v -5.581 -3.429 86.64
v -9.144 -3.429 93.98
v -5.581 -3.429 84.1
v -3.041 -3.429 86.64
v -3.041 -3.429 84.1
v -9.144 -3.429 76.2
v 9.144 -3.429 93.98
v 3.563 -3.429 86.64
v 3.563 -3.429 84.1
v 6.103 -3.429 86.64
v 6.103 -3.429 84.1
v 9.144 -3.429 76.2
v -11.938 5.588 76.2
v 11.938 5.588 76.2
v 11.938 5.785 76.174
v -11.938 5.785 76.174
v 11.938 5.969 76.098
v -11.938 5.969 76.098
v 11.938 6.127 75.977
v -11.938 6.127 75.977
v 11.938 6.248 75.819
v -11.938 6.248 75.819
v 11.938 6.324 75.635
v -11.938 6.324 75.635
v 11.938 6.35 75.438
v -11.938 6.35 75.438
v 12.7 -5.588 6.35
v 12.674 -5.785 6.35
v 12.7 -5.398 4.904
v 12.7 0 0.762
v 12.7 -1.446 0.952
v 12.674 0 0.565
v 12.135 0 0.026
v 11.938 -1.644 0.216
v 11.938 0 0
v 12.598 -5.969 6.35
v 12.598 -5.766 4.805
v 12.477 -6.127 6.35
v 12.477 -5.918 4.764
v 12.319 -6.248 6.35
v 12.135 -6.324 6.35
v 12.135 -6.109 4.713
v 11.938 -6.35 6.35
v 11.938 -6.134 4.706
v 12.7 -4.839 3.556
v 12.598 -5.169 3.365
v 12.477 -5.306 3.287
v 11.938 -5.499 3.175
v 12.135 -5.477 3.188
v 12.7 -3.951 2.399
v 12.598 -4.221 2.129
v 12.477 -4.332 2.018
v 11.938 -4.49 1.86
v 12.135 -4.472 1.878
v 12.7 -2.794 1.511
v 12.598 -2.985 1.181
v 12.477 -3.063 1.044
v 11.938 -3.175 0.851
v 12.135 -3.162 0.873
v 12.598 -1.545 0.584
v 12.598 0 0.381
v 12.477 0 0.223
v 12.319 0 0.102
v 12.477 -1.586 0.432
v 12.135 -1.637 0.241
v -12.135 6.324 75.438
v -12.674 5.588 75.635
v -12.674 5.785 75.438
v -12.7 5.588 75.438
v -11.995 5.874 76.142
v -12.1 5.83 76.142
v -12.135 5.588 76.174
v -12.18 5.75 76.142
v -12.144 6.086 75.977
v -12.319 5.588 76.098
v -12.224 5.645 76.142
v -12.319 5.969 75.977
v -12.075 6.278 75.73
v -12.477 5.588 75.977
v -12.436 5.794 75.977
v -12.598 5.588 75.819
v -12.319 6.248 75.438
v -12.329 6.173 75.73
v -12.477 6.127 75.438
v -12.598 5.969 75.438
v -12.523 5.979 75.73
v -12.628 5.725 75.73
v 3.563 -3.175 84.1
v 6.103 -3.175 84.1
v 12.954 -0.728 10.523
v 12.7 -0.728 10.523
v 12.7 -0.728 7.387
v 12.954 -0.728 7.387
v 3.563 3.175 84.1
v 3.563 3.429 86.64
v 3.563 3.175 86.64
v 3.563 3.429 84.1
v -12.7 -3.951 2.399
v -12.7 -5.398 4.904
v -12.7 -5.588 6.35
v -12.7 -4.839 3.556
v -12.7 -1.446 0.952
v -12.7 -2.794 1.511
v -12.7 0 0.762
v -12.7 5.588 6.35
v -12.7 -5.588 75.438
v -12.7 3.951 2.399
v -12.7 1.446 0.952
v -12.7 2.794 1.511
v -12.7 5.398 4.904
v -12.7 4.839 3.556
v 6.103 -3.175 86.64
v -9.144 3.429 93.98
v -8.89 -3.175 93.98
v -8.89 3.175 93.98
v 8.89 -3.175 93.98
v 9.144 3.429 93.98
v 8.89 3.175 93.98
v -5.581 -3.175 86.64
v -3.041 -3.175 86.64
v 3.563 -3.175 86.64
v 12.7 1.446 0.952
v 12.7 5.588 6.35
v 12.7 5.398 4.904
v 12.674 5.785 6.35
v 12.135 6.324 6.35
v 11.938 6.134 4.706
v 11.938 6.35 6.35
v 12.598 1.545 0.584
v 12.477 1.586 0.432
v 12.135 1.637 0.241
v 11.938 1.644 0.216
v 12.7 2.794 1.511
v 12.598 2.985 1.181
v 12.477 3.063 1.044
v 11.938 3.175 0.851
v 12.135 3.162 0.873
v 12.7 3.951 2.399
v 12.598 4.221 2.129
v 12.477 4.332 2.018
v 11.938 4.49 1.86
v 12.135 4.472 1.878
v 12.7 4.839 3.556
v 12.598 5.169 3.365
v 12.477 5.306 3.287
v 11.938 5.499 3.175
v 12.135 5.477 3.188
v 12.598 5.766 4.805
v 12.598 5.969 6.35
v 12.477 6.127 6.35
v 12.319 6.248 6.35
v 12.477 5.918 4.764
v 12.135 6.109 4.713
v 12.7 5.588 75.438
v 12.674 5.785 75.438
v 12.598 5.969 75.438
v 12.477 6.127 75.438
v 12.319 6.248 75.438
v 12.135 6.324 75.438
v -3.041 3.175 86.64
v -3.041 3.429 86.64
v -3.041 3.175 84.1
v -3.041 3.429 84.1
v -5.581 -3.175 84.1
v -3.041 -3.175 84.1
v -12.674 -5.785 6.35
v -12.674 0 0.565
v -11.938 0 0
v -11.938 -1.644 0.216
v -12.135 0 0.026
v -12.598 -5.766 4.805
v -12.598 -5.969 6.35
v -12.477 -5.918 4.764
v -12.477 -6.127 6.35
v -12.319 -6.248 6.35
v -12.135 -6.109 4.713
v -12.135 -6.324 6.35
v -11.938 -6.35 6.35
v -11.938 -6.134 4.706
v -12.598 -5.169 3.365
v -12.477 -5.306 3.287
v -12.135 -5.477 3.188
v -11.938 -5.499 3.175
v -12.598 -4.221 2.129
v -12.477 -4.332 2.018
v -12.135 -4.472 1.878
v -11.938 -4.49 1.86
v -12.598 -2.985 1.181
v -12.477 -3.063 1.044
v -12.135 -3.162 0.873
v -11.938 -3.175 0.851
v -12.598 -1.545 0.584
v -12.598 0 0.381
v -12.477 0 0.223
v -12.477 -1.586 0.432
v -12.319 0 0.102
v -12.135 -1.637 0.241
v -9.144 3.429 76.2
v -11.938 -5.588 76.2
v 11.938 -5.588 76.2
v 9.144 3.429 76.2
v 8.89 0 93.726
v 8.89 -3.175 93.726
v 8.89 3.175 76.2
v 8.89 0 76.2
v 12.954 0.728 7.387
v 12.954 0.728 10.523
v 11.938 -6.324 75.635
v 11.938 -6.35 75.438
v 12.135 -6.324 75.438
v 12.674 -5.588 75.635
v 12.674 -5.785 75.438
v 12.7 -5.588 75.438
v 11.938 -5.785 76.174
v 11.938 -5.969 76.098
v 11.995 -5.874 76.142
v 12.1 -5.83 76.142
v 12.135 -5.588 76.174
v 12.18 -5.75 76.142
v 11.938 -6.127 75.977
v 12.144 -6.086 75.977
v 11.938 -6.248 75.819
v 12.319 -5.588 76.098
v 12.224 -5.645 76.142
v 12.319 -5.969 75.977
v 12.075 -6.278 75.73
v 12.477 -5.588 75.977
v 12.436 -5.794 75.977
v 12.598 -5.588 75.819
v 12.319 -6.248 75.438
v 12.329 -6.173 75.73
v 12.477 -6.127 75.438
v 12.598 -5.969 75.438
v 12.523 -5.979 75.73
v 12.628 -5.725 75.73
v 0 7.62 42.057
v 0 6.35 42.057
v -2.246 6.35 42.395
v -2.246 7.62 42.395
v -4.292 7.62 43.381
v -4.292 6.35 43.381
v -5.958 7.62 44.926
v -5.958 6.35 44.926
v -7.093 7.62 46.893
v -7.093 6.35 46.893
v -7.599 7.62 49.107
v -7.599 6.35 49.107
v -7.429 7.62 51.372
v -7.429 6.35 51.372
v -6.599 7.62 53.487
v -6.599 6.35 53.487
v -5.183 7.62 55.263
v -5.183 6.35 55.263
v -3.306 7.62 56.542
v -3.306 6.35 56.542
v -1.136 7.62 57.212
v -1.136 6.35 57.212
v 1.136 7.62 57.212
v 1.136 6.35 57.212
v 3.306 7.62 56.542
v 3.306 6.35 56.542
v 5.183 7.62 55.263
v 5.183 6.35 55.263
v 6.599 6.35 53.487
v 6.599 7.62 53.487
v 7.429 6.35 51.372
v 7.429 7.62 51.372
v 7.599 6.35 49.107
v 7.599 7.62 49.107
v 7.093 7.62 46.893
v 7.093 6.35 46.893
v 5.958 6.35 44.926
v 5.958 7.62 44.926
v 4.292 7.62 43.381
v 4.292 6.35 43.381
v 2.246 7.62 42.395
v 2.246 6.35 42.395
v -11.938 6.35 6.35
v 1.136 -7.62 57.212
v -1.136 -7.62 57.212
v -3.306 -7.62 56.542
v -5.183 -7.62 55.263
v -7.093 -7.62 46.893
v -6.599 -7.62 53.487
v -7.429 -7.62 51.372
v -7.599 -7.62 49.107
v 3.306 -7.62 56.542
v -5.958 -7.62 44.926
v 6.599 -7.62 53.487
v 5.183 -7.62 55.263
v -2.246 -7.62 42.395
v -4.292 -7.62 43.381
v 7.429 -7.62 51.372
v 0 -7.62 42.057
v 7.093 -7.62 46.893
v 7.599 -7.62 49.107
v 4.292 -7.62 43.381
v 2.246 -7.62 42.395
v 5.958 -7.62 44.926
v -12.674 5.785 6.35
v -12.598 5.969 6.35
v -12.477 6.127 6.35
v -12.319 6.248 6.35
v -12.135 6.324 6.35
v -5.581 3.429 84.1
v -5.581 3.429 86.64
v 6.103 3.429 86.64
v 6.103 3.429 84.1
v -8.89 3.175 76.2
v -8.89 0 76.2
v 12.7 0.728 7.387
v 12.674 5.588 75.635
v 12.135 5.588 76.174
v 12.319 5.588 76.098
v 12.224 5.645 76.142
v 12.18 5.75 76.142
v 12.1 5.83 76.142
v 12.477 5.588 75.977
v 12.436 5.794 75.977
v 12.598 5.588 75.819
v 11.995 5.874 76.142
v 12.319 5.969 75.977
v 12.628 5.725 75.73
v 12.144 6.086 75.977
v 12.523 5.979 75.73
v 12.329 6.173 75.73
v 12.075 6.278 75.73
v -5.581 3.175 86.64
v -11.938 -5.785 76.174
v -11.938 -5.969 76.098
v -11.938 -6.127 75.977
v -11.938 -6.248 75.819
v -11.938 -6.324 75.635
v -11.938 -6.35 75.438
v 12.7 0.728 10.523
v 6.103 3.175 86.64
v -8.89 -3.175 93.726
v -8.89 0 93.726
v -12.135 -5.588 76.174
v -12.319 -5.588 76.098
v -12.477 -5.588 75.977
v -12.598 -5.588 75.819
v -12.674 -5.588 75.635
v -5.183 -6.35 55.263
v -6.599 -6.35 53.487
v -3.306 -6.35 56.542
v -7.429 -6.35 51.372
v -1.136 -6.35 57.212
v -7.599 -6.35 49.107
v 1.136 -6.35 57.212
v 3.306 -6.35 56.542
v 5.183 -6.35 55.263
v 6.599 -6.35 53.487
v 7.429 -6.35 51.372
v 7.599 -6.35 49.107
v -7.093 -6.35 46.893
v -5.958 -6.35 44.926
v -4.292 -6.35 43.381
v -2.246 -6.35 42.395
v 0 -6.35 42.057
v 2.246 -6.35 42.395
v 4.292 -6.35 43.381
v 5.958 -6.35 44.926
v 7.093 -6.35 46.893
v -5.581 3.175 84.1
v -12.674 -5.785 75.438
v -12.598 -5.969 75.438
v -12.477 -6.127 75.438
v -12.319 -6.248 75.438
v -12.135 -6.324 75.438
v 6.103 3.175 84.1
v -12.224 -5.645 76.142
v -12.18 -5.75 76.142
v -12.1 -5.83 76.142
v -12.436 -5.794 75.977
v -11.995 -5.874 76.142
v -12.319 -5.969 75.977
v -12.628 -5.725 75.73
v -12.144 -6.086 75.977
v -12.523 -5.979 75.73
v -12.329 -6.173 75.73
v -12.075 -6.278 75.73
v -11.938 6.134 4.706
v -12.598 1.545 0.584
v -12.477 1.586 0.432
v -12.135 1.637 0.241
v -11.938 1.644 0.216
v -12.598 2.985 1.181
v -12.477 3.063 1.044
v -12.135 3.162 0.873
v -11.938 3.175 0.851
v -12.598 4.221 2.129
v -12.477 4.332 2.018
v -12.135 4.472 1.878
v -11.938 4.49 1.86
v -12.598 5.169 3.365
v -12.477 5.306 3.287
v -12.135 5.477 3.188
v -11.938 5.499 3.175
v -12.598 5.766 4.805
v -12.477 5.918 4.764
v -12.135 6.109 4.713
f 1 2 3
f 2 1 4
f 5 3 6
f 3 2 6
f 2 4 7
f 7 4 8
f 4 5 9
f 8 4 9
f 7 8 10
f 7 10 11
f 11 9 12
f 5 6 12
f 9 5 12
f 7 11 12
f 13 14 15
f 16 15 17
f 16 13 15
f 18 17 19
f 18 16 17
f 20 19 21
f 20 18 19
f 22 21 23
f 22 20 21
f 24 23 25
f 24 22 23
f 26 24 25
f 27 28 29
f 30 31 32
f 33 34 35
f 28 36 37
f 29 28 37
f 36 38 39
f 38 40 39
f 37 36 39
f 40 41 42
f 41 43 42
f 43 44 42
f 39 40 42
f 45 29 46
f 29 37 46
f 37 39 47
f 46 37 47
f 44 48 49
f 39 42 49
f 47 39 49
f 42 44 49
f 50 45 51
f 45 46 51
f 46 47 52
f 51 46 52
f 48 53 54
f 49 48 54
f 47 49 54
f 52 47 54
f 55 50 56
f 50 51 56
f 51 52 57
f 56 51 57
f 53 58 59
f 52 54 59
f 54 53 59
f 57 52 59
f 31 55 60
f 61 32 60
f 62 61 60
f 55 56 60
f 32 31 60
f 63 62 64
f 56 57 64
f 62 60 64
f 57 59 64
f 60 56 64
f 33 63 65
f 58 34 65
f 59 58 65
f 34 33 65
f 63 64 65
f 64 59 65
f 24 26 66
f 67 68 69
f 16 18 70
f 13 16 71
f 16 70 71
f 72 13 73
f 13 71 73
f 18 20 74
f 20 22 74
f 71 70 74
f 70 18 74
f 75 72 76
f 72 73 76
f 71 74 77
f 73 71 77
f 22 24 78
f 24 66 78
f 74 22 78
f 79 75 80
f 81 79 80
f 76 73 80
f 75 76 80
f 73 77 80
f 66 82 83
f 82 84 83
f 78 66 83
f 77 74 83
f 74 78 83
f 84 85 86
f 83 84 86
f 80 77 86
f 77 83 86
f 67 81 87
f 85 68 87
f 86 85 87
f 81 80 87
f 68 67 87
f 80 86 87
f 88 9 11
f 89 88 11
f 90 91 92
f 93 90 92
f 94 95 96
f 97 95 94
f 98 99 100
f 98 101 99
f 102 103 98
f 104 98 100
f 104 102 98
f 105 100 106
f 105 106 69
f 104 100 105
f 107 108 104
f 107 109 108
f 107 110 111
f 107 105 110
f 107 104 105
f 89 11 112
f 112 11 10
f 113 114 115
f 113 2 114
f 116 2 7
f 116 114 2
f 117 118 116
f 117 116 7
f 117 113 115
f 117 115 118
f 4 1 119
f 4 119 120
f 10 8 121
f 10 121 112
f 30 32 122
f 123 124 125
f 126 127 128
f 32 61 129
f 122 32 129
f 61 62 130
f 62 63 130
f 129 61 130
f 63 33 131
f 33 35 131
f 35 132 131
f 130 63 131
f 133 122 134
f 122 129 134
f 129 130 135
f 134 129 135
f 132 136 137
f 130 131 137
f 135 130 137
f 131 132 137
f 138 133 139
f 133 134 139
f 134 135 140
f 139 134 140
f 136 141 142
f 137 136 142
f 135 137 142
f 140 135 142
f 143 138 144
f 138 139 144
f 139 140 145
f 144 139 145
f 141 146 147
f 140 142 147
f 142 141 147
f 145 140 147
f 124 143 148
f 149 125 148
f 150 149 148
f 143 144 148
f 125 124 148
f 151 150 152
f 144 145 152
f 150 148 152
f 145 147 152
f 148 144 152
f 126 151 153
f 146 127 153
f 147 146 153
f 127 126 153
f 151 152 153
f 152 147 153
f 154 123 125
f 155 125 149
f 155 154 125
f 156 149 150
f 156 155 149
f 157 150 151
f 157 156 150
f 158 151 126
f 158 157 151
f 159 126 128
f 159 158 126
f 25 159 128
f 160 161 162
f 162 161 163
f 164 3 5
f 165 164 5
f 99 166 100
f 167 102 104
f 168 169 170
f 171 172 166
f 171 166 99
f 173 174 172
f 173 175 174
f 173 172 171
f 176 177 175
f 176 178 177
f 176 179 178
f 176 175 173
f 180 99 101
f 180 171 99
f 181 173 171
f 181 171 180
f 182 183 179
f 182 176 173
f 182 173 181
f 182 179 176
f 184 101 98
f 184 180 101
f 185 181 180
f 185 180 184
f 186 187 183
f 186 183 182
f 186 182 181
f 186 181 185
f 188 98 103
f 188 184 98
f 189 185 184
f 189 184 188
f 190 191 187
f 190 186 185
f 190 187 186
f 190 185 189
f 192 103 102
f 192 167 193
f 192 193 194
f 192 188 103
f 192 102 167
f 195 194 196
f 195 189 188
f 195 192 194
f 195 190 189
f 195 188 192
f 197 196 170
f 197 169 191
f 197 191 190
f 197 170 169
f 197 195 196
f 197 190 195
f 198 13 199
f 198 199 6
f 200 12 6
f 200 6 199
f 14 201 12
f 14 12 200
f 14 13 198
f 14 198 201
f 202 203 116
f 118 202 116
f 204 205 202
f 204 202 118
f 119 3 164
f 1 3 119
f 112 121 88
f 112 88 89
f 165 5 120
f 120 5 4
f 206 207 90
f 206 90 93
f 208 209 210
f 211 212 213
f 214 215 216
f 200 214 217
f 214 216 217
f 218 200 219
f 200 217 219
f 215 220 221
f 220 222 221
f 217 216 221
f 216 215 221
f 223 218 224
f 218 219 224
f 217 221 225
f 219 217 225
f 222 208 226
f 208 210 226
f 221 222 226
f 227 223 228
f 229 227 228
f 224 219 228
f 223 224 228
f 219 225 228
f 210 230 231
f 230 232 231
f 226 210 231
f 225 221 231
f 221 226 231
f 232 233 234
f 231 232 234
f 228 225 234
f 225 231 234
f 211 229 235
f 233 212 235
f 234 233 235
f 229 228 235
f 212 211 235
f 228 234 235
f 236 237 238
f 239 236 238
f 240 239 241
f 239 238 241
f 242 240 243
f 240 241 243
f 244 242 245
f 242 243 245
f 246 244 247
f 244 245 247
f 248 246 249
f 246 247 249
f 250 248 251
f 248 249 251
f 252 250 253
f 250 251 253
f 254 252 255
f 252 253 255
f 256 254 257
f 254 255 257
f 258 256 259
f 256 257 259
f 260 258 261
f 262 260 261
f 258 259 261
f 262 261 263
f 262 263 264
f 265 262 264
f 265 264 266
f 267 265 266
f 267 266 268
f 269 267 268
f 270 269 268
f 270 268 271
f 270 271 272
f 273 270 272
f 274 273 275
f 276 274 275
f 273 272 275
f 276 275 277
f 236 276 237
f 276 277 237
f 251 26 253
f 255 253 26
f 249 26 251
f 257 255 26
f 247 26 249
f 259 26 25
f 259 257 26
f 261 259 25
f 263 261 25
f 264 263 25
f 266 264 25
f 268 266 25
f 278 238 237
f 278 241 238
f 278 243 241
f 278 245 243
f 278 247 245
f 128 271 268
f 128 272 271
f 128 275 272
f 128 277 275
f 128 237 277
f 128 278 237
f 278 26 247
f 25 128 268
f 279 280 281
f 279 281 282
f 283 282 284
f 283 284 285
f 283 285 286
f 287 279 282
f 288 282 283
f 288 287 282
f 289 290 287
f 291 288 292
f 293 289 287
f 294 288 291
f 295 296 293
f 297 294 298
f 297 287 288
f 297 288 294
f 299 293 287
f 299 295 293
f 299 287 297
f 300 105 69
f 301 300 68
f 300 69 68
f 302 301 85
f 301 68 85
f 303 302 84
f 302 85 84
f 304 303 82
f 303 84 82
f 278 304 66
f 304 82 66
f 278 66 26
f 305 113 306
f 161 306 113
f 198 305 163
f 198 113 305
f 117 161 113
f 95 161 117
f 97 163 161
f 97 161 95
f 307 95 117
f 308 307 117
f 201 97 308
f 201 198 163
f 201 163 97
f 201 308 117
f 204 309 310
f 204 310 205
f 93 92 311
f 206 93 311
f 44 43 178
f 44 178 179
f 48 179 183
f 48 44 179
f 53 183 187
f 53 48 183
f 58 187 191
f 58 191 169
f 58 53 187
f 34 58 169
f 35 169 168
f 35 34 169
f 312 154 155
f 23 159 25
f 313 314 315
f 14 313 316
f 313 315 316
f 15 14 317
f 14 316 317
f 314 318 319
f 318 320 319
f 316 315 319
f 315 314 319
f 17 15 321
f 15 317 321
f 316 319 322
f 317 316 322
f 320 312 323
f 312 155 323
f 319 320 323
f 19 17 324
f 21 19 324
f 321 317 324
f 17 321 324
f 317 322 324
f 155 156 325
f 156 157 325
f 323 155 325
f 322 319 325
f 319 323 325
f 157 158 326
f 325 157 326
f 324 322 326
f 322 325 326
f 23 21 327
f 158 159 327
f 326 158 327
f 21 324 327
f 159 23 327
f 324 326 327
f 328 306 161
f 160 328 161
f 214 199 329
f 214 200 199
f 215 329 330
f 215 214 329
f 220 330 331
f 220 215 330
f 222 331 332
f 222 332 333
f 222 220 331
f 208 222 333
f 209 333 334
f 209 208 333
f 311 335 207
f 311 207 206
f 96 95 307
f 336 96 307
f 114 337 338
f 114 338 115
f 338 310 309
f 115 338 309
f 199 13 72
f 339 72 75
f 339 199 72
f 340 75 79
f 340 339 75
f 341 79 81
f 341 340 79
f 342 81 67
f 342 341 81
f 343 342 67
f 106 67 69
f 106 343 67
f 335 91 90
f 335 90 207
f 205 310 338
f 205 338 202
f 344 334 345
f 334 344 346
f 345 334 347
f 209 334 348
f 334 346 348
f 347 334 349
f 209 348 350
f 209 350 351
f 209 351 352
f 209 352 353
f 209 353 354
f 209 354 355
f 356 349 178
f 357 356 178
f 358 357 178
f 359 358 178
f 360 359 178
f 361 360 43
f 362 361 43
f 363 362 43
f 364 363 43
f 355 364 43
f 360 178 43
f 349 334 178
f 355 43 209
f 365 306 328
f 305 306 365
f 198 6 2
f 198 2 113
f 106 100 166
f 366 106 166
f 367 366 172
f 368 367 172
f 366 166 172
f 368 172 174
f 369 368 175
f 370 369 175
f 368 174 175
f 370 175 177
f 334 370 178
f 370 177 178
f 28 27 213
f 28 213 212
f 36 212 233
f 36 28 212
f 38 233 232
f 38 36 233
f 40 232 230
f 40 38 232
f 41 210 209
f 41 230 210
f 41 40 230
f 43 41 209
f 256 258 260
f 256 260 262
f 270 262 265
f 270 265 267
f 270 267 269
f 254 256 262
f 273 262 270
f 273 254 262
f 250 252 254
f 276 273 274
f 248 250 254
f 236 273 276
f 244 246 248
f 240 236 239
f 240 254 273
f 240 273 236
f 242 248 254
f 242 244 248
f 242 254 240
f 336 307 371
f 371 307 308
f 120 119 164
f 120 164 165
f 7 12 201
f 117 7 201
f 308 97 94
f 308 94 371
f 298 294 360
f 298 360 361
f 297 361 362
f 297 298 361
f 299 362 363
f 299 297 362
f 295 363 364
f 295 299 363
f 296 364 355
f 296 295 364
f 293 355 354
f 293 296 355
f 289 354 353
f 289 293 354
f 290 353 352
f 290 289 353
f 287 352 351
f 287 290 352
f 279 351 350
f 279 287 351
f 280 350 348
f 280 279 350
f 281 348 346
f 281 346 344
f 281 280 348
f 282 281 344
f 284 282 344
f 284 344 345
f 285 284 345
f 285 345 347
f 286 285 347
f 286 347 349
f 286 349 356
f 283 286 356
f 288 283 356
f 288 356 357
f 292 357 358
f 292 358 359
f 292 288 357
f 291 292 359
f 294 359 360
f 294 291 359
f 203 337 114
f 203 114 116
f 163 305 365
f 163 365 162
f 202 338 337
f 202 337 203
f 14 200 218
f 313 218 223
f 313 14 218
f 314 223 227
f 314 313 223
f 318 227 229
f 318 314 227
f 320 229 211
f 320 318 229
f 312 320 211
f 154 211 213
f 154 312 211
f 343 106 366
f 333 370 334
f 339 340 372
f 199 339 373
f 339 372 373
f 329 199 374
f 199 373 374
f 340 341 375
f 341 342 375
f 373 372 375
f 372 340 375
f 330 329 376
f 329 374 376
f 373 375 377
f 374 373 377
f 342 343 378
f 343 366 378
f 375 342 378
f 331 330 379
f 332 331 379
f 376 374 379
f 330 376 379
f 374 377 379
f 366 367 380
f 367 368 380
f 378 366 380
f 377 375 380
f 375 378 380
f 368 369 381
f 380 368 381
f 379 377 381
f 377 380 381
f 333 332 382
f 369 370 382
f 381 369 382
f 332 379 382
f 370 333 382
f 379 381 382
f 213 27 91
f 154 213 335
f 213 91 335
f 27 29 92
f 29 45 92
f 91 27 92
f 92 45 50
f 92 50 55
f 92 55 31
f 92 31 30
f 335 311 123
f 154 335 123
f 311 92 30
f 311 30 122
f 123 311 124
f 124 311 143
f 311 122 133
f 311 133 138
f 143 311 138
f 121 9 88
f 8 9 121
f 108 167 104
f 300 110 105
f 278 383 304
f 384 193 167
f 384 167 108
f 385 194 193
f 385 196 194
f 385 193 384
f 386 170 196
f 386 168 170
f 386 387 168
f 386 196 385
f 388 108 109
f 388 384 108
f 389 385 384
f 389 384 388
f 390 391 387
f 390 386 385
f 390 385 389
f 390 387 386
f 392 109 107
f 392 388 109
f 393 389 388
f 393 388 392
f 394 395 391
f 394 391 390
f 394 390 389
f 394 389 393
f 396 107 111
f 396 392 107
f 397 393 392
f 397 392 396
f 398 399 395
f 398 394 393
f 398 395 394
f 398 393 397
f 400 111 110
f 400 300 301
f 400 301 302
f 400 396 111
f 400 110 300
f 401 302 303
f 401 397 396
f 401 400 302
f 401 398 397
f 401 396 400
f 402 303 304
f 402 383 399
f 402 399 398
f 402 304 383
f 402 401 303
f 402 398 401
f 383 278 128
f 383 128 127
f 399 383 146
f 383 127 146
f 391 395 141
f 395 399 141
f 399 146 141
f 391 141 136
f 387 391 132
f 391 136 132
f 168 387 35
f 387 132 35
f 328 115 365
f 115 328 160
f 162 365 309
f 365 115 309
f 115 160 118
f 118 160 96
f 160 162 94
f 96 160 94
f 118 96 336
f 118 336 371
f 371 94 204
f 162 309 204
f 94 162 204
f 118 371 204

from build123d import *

# Parameters (mm, degrees)
SKETCH1_W           = 25.4
SKETCH1_H           = 12.7
BOSS_EXTRUDE1_DEPTH = 76.2
FILLET1_R           = 6.35
SKETCH3_W           = 18.288
SKETCH3_H           = 6.858
SKETCH3_W_2         = 17.78
SKETCH3_H_2         = 6.35
BOSS_EXTRUDE2_DEPTH = 17.78
SKETCH4_W           = 17.78
SKETCH4_H           = 3.175
BOSS_EXTRUDE3_DEPTH = 17.526
SKETCH5_W           = 2.54
SKETCH5_H           = 2.54
CUT_EXTRUDE1_DEPTH  = 0.254
SKETCH7_W           = 2.54
SKETCH7_H           = 2.54
CUT_EXTRUDE6_DEPTH  = 0.254
FILLET2_R           = 0.762
FILLET3_R           = 0.762
SKETCH20_R          = 7.62
BOSS_EXTRUDE4_DEPTH = 1.27
BOSS_EXTRUDE5_START = 1.27
SKETCH21_R          = 7.62
BOSS_EXTRUDE5_DEPTH = 1.27
SKETCH23_W          = 3.136693438
SKETCH23_H          = 1.456321954
BOSS_EXTRUDE6_DEPTH = 0.254


with BuildPart() as part:
    # Sketch1 → Boss-Extrude1 (new body)
    with BuildSketch(Plane.XY):
        Rectangle(SKETCH1_W, SKETCH1_H)
    extrude(amount=BOSS_EXTRUDE1_DEPTH)

    # Fillet1
    fillet1_edges = [part.edges().sort_by_distance(p)[0] for p in [
        (0, 6.35, 0),
        (0, -6.35, 0),
    ]]
    fillet(fillet1_edges, radius=FILLET1_R - 0.0001)  # a hair under: the kernel refuses the full size

    # Sketch3 → Boss-Extrude2 (add)
    with BuildSketch(Plane.XY.offset(76.2)):
        Rectangle(SKETCH3_W, SKETCH3_H)
        Rectangle(SKETCH3_W_2, SKETCH3_H_2, mode=Mode.SUBTRACT)
    extrude(amount=BOSS_EXTRUDE2_DEPTH)

    # Sketch4 → Boss-Extrude3 (add)
    with BuildSketch(Plane.XY.offset(76.2)):
        with Locations((0, -1.5875)):
            Rectangle(SKETCH4_W, SKETCH4_H)
    extrude(amount=BOSS_EXTRUDE3_DEPTH)

    # Sketch5 → Cut-Extrude1 (cut)
    with BuildSketch(Plane(origin=(0, 3.429, 0), x_dir=(1, 0, 0), z_dir=(0, 1, 0))):
        with Locations((4.832637326, -85.369889154)):
            Rectangle(SKETCH5_W, SKETCH5_H)
        with Locations((-4.311362674, -85.369889154)):
            Rectangle(SKETCH5_W, SKETCH5_H)
    extrude(amount=-CUT_EXTRUDE1_DEPTH, mode=Mode.SUBTRACT)

    # Sketch7 → Cut-Extrude6 (cut)
    with BuildSketch(Plane.XZ.offset(3.429)):
        with Locations((4.832637326, 85.369889154)):
            Rectangle(SKETCH7_W, SKETCH7_H)
        with Locations((-4.311362674, 85.369889154)):
            Rectangle(SKETCH7_W, SKETCH7_H)
    extrude(amount=-CUT_EXTRUDE6_DEPTH, mode=Mode.SUBTRACT)

    # Fillet2
    fillet2_edges = [part.edges().sort_by_distance(p)[0] for p in [
        (-12.7, -4.49015735, 1.85984265),
        (-12.7, 4.49015735, 1.85984265),
        (12.7, -4.49015735, 1.85984265),
        (12.7, 4.49015735, 1.85984265),
        (12.7, -6.35, 41.27495),
        (-12.7, -6.35, 41.27495),
        (-12.7, 6.35, 41.27495),
        (12.7, 6.35, 41.27495),
    ]]
    fillet(fillet2_edges, radius=FILLET2_R)

    # Fillet3
    fillet3_edges = [part.edges().sort_by_distance(p)[0] for p in [
        (0, -6.35, 76.2),
        (-12.7, 0, 76.2),
        (12.7, 0, 76.2),
        (0, 6.35, 76.2),
        (12.476815367, 6.126815367, 76.2),
        (-12.476815367, 6.126815367, 76.2),
        (12.476815367, -6.126815367, 76.2),
        (-12.476815367, -6.126815367, 76.2),
    ]]
    fillet(fillet3_edges, radius=FILLET3_R)

    # Sketch20 → Boss-Extrude4 (add)
    with BuildSketch(Plane(origin=(0, 6.35, 0), x_dir=(1, 0, 0), z_dir=(0, 1, 0))):
        with Locations(Location((0, -49.676760647, 0), (0, 0, 90))):
            Circle(SKETCH20_R)
    extrude(amount=BOSS_EXTRUDE4_DEPTH)

    # Sketch21 → Boss-Extrude5 (add)
    with BuildSketch(Plane.XZ.offset(6.35).offset(BOSS_EXTRUDE5_START)):
        with Locations(Location((0, 49.676760647, 0), (0, 0, 270))):
            Circle(SKETCH21_R)
    extrude(amount=-BOSS_EXTRUDE5_DEPTH)

    # Sketch23 → Boss-Extrude6 (add)
    with BuildSketch(Plane(origin=(12.7, 0, 0), x_dir=(0, 0, -1), z_dir=(1, 0, 0))):
        with Locations((-8.954865749, 0)):
            Rectangle(SKETCH23_W, SKETCH23_H)
    extrude(amount=BOSS_EXTRUDE6_DEPTH)


solid = part.part
